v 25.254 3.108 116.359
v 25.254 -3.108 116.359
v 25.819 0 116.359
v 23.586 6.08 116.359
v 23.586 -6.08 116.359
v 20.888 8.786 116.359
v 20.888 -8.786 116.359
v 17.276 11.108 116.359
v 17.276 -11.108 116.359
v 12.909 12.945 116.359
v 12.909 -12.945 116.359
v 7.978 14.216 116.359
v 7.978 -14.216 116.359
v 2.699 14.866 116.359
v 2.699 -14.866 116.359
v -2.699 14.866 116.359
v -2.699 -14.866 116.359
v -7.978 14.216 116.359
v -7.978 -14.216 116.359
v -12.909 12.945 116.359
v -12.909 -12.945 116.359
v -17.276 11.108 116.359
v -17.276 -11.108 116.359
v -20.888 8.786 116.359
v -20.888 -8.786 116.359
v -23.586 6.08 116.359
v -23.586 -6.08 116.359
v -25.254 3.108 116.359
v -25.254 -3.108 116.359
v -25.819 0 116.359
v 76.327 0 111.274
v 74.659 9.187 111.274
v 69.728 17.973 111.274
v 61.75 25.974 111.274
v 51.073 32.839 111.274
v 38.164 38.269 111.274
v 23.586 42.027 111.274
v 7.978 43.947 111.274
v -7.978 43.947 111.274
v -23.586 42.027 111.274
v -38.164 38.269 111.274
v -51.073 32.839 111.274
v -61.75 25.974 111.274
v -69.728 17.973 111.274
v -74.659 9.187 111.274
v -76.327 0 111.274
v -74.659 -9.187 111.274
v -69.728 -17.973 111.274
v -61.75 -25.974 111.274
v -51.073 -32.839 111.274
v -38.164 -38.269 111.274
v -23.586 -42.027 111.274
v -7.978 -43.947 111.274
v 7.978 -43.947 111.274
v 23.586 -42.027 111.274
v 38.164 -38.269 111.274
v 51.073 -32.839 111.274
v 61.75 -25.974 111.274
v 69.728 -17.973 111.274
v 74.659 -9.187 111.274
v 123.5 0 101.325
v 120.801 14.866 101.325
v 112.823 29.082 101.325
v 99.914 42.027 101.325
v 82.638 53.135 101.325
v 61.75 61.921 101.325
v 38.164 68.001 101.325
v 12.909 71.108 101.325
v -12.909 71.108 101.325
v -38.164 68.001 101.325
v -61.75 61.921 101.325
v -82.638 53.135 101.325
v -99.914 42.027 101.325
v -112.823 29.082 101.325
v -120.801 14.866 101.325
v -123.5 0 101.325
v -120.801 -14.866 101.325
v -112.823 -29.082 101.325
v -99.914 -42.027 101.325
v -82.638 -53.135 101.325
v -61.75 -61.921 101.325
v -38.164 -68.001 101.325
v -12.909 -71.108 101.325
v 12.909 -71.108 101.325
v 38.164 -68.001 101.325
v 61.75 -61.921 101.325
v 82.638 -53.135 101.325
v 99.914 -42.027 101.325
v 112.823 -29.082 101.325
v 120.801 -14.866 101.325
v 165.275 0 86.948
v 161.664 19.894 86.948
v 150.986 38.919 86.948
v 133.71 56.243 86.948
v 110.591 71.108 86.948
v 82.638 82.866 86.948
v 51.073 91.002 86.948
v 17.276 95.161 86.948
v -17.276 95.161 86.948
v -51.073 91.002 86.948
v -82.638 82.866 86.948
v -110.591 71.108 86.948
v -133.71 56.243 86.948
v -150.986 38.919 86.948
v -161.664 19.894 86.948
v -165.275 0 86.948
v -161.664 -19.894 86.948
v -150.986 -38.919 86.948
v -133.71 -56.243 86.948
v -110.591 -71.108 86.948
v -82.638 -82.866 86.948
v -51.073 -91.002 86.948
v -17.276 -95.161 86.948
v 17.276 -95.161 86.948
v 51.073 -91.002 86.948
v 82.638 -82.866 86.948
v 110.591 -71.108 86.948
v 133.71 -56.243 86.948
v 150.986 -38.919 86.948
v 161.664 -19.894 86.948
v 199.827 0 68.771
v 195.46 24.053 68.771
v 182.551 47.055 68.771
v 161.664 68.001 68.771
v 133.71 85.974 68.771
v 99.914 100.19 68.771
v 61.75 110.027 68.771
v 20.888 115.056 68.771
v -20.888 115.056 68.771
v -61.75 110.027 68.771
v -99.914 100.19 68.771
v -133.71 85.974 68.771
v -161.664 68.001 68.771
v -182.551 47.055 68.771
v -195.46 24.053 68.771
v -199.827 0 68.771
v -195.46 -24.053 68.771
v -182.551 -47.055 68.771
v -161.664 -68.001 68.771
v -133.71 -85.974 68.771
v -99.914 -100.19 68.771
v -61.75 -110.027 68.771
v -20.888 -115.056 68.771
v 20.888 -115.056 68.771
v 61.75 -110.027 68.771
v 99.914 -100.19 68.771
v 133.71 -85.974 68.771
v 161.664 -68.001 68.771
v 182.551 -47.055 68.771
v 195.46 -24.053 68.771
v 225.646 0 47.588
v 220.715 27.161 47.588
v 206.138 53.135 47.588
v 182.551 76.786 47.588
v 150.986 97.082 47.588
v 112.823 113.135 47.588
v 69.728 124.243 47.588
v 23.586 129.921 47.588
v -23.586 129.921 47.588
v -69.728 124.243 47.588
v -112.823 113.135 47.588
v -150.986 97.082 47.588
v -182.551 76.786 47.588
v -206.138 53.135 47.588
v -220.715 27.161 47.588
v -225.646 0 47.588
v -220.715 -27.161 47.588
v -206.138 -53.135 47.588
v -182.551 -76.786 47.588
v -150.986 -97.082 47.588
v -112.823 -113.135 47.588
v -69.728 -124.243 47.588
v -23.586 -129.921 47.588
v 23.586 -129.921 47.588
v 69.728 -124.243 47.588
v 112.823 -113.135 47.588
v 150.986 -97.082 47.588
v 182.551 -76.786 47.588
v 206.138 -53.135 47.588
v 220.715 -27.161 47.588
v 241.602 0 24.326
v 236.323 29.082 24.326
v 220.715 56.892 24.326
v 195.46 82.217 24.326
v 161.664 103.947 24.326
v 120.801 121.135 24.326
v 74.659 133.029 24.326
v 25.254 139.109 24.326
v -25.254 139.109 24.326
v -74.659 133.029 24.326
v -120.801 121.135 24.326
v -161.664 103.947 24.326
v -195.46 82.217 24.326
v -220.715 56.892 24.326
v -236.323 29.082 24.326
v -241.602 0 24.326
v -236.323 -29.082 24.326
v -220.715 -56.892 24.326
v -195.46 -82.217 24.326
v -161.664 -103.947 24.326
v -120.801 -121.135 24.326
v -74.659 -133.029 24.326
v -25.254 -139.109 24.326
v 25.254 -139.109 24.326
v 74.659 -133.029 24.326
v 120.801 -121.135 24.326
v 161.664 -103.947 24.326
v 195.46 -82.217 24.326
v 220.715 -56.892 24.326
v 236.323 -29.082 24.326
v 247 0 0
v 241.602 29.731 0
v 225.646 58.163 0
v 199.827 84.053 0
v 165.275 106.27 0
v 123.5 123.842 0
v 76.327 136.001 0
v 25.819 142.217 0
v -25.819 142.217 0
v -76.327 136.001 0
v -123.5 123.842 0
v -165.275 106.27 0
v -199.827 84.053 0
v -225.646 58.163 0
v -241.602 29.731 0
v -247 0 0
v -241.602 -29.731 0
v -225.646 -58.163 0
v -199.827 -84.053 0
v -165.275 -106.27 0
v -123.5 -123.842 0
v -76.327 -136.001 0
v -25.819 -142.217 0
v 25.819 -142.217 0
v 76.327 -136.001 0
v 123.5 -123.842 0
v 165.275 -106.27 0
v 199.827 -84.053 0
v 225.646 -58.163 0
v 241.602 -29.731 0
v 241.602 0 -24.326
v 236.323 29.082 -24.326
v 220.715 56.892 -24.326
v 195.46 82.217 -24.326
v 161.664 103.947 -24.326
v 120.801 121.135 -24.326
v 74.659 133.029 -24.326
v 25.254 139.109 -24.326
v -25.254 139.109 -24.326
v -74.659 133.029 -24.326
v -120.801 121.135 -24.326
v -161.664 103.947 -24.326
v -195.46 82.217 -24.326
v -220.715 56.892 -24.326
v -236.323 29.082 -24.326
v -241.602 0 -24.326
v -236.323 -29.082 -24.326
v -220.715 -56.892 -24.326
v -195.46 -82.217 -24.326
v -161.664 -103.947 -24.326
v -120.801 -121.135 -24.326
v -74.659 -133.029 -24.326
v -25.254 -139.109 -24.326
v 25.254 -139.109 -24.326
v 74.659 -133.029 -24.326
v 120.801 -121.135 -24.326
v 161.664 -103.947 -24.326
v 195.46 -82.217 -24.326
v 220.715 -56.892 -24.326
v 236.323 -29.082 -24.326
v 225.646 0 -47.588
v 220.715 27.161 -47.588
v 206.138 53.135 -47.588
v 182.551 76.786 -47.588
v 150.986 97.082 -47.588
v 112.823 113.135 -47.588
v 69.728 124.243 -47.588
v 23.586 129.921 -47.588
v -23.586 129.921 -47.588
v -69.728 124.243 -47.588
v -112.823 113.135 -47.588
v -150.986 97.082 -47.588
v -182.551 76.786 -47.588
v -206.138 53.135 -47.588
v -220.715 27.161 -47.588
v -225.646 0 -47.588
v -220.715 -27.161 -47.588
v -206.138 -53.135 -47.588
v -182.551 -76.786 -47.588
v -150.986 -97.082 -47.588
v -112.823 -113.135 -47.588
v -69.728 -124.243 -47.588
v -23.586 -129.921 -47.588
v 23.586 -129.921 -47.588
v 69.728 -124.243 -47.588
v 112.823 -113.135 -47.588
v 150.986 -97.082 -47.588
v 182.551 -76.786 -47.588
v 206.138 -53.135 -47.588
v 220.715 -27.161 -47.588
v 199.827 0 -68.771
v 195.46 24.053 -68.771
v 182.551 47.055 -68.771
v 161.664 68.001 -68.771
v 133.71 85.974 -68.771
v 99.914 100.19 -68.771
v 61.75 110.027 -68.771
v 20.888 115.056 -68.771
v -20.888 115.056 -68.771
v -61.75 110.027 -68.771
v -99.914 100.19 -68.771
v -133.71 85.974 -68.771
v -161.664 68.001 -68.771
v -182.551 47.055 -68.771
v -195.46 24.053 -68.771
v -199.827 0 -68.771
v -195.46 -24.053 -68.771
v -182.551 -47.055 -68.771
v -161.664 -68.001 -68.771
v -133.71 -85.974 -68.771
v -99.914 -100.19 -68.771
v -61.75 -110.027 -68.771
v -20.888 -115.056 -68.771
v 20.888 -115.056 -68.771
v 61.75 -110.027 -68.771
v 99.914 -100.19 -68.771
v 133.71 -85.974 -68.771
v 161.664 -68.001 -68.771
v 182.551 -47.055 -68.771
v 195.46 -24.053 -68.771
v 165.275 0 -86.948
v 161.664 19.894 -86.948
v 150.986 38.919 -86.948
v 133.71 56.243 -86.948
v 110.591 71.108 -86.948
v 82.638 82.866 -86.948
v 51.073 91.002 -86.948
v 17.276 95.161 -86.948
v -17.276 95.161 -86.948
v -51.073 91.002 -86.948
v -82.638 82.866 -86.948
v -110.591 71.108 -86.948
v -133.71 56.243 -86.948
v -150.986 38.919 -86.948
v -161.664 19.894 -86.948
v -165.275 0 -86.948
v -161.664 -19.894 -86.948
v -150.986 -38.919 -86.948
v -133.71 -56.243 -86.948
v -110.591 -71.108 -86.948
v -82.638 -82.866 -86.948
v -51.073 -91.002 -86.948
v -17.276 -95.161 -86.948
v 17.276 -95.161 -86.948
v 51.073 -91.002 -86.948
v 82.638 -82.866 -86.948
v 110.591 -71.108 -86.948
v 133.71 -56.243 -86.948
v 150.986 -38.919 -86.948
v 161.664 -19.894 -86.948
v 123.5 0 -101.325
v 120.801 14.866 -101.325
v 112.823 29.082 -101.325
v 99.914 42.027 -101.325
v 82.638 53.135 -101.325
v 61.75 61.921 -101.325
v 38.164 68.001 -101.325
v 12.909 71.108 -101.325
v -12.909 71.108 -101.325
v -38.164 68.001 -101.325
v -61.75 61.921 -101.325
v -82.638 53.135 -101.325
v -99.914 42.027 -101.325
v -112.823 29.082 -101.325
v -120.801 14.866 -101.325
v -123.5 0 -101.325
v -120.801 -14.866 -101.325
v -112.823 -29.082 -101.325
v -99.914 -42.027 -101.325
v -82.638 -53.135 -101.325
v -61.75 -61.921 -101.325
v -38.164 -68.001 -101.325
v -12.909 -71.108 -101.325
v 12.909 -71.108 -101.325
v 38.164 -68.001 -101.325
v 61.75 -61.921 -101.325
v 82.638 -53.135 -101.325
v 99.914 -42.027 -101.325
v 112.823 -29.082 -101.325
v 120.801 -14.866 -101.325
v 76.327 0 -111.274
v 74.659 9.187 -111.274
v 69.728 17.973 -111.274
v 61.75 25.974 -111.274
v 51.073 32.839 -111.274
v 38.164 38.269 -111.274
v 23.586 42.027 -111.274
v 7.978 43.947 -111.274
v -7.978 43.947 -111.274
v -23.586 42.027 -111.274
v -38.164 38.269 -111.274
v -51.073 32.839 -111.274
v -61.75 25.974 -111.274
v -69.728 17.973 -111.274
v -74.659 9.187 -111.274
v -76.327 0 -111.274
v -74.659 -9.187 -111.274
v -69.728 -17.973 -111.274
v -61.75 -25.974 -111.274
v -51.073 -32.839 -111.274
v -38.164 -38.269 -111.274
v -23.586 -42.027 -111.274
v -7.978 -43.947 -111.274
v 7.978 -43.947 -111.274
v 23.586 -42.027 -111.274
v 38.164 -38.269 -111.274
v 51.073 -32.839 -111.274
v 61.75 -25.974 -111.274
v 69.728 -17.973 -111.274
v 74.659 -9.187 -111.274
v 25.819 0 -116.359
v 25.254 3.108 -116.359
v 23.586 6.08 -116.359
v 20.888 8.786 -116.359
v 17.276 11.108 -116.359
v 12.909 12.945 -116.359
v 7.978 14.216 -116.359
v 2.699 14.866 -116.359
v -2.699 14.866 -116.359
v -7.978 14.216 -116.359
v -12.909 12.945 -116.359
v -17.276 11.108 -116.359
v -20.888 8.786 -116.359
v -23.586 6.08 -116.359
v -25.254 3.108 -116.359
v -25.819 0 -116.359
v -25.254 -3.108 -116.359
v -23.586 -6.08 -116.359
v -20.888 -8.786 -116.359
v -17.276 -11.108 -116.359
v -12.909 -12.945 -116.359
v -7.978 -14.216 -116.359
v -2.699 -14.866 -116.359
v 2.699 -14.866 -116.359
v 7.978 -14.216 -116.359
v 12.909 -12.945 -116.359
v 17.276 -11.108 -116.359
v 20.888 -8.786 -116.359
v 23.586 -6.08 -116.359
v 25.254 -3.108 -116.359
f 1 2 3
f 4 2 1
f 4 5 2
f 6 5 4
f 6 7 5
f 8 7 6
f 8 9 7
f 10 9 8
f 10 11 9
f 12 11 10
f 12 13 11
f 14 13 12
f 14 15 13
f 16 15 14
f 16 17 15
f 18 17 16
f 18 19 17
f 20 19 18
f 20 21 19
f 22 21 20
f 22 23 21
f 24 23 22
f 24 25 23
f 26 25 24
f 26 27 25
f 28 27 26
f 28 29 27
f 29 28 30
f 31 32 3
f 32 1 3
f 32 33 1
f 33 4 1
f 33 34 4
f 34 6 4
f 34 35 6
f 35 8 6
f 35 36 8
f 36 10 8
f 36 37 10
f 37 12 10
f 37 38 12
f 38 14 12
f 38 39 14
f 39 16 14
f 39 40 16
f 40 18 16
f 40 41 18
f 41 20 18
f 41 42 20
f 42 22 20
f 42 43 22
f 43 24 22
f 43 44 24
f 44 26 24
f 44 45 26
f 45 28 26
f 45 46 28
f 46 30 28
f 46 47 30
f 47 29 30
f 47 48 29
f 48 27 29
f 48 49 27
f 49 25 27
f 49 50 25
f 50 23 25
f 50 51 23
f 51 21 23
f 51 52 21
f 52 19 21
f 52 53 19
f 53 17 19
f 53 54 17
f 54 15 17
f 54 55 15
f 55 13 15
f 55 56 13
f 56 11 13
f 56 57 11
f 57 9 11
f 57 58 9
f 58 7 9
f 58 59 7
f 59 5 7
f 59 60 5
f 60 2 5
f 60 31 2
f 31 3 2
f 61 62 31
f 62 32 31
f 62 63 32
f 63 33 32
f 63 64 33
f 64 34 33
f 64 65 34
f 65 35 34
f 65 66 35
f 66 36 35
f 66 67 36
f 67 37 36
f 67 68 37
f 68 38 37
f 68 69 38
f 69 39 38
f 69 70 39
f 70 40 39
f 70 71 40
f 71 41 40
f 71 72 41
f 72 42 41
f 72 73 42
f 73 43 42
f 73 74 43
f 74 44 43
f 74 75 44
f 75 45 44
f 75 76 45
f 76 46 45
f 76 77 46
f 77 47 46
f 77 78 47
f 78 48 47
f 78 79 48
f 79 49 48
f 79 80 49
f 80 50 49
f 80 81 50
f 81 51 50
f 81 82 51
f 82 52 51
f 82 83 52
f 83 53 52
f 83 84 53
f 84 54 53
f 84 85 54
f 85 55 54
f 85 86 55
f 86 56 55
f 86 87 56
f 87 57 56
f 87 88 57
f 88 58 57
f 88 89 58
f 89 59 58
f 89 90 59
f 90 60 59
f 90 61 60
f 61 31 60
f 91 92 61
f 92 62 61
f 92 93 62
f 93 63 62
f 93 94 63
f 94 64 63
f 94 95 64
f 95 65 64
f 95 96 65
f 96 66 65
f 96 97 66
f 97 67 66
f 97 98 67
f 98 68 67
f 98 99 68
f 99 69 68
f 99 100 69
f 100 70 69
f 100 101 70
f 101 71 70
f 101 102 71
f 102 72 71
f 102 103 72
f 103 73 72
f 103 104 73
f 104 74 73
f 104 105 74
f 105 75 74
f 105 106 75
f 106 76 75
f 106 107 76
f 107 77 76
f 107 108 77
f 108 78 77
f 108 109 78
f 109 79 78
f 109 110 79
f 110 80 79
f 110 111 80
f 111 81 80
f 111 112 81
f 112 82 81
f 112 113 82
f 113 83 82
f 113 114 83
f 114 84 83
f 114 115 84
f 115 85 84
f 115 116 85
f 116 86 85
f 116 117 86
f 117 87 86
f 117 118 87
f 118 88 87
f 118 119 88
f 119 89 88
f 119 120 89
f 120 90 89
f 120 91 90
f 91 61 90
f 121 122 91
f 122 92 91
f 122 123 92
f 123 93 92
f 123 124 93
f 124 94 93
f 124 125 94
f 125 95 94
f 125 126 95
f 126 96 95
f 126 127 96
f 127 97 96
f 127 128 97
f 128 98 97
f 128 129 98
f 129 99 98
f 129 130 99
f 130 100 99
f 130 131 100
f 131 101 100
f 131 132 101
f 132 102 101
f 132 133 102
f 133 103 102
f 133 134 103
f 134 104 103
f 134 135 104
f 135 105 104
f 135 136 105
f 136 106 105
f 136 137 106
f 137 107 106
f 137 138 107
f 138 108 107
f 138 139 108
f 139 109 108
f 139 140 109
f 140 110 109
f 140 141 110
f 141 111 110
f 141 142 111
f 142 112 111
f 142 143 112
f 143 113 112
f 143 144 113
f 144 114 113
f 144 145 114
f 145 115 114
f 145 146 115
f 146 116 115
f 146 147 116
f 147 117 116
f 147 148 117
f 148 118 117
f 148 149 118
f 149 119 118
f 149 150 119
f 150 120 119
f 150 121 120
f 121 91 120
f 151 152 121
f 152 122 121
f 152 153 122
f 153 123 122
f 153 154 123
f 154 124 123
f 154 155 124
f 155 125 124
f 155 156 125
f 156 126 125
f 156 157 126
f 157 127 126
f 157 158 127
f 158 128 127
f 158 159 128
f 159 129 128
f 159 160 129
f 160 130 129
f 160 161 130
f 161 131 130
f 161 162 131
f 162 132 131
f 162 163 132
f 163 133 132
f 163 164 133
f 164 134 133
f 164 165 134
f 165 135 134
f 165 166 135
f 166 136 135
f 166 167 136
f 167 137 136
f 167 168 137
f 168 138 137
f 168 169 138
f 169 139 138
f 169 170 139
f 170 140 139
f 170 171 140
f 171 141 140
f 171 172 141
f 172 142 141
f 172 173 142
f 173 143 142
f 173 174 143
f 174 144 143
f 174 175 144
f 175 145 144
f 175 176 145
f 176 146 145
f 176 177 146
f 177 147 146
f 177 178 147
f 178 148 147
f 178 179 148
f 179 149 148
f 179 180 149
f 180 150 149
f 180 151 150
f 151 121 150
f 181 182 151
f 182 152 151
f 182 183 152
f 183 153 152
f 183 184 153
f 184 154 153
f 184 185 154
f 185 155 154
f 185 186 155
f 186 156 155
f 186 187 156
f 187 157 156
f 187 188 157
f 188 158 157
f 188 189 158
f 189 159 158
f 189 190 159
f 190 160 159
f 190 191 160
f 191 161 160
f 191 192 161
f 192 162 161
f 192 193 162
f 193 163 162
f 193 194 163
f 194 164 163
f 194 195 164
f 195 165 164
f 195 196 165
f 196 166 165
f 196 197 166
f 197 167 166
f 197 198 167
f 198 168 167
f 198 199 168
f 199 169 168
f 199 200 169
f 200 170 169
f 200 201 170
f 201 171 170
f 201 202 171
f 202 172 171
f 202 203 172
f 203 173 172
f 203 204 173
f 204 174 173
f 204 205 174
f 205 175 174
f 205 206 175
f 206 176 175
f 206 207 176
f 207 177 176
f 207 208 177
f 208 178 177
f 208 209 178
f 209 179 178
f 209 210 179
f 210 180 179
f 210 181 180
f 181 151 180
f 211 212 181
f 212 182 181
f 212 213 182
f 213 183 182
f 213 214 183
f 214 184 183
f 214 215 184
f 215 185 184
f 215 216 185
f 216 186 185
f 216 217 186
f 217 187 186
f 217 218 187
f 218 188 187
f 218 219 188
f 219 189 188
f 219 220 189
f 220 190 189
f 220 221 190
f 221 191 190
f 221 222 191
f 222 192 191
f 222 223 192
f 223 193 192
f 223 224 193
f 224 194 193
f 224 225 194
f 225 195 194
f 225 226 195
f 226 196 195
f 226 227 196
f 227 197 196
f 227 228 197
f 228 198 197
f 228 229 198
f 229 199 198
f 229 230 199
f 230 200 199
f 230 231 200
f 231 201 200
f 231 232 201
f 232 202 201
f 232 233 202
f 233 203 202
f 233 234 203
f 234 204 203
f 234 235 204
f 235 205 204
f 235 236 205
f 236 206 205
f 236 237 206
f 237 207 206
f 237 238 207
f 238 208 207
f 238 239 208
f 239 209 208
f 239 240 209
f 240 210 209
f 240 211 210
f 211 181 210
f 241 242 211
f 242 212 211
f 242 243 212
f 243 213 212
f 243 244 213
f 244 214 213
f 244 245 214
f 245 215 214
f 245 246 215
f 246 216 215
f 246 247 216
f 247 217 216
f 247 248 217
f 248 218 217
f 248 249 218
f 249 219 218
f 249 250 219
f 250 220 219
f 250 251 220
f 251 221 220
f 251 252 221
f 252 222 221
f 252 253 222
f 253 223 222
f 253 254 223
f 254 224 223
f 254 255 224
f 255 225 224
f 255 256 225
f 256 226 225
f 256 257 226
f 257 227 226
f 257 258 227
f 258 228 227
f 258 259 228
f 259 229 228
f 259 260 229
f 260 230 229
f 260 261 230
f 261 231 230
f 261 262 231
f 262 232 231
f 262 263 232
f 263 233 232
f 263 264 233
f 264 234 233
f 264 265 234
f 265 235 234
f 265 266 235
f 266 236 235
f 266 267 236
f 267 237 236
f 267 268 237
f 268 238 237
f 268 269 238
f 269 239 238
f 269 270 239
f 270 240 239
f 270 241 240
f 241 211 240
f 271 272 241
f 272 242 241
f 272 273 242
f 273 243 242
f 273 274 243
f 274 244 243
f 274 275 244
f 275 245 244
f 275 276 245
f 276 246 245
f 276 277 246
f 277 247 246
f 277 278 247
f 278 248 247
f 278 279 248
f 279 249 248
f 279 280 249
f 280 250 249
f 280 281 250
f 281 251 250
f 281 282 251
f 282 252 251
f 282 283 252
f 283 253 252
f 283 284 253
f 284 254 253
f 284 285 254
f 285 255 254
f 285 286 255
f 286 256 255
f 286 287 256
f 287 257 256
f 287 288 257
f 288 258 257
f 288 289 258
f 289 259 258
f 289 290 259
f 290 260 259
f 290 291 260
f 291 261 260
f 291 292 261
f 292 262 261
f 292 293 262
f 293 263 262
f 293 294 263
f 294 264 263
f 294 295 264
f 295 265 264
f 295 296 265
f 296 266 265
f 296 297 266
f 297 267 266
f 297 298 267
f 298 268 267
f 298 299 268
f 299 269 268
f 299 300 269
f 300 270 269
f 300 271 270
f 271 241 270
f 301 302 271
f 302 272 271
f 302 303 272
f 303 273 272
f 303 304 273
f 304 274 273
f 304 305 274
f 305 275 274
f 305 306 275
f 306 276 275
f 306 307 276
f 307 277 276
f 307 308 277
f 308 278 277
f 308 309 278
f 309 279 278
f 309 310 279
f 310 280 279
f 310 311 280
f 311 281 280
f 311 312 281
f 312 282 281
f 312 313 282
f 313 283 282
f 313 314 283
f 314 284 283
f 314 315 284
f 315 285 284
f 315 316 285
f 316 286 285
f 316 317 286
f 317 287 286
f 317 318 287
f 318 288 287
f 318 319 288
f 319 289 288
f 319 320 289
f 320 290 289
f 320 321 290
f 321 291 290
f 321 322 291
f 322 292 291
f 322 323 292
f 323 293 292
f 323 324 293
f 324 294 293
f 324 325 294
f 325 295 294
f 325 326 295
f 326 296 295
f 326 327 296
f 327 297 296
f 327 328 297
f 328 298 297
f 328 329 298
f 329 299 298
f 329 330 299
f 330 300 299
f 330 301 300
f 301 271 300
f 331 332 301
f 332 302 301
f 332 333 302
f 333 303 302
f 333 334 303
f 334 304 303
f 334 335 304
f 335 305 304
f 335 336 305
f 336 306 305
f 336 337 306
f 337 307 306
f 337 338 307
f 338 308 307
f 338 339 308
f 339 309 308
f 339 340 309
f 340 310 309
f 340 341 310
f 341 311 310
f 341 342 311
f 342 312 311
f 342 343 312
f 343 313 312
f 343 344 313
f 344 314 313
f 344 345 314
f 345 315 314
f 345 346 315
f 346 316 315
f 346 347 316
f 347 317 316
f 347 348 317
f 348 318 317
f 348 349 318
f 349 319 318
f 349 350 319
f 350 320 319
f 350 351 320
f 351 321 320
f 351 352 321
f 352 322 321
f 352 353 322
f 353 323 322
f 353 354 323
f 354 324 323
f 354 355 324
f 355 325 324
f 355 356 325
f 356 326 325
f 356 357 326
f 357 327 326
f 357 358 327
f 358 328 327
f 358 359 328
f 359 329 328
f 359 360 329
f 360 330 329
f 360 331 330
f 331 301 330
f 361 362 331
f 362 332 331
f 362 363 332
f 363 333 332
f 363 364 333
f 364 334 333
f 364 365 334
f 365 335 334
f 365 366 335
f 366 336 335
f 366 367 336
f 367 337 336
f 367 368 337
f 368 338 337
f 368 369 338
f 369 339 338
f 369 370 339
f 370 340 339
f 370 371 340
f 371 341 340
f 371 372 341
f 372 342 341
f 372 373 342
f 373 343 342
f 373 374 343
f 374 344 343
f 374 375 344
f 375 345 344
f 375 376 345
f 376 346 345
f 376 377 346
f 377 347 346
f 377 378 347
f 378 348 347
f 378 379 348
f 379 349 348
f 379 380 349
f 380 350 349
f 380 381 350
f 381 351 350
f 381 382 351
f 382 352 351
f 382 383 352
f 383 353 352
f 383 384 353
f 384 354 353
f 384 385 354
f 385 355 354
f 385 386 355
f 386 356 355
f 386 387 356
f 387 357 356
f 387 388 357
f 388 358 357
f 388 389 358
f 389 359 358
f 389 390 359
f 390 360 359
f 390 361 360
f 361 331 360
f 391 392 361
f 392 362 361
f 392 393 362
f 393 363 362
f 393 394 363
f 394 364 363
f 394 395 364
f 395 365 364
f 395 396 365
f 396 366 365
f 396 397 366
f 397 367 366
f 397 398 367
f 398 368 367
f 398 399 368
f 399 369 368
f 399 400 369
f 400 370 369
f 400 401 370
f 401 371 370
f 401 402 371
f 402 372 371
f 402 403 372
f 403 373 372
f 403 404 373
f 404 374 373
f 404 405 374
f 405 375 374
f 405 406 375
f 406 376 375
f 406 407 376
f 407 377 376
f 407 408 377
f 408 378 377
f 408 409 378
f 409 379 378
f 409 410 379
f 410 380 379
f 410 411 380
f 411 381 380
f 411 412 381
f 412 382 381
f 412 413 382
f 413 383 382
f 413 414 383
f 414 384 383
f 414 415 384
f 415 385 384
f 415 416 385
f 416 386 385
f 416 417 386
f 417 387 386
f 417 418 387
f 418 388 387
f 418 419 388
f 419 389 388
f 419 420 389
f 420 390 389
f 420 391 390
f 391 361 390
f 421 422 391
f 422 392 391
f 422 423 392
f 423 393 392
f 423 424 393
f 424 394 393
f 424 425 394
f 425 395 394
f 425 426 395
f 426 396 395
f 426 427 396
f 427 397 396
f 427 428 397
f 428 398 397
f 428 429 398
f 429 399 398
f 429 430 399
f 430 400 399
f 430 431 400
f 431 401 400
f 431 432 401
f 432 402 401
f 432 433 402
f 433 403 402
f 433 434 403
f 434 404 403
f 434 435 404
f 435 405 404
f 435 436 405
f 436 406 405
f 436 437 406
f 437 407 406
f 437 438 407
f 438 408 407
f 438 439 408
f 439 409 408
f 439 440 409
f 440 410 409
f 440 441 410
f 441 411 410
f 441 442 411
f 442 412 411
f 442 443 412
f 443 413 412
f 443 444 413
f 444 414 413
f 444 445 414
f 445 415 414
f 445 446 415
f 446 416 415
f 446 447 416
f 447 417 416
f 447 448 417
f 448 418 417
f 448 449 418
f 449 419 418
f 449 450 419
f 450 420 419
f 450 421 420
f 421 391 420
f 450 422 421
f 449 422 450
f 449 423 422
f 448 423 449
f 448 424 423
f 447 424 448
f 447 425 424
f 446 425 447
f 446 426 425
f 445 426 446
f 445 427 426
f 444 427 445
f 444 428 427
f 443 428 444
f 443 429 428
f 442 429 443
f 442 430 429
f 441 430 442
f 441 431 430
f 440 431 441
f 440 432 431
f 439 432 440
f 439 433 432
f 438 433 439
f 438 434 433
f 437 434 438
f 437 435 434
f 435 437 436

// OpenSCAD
// Generated by SolidPython 1.0.1 on 2020-07-29 00:46:54


scale(v = [19, 11, 9]) {
	sphere(r = 13);
}
/***********************************************
*********      SolidPython code:      **********
************************************************
 
# import packages: SolidPython
from solid import *
from solid.utils import *
from itertools import chain, combinations, permutations


class Resize:

    def __init__(self, scad_file):
        self.scad_file = scad_file
        #self.scad_file = import_scad(scad_file)
        # cone/cylinder param:
        self.r1 = 0
        self.r2 = 0
        self.h = 0
        # rectangular prism param:
        self.w = 0
        self.l = 0
        # ellipse param:
        self.r = 0

    # import OpenScad code (file name corresponds to shape)


    # classify shape + parameters
    def assign(self, param1, param2, param3):
        if self.scad_file == 'cone.scad':
            self.r1 = param1
            self.r2 = param2
            self.h = param3
        elif self.scad_file == 'cylinder.scad':
            self.r1 = param1
            self.r2 = param2
            self.h = param3
        elif self.scad_file == 'rectangularPrism.scad':
            self.h = param1
            self.l = param2
            self.w = param3
        else:
            self.r = param1
            self.h = param2

    # resize parameters
    def iterate(self):
        x = range(3, 20, 2)
        i = 1
        if self.scad_file == 'cone.scad':
            tempList = list(permutations(x, 2))
            for temp in tempList:
                param1 = temp[0]
                param2 = temp[1]
                filepath = 'produced_scad_files/' + 'cone' + str(param1) + '_' + str(param2) + '_' + '.scad'
                scad_render_to_file(cylinder(h=param1, r1=param2, r2=0), filepath)

        elif self.scad_file == 'cylinder.scad':
            tempList = list(permutations(x, 3))
            for temp in tempList:
                param1 = temp[0]
                param2 = temp[1]
                filepath = 'produced_scad_files/' + 'cylinder' + str(param1) + '_' + str(param2) + '_' + '.scad'
                scad_render_to_file(cylinder(h=param1, r1=param2, r2=param2), filepath)

        elif self.scad_file == 'rectangularPrism.scad':
            tempList = list(permutations(x, 3))
            for temp in tempList:
                param1 = temp[0]
                param2 = temp[1]
                param3 = temp[2]
                filepath = 'produced_scad_files/' + 'rectangularPrism' + str(param1) + '_' + str(param2) + '_' + str(
                    param3) + '.scad'
                scad_render_to_file(cube(size=(param1, param2, param3)), filepath)

        elif self.scad_file == 'ellipse.scad':
            tempList = list(permutations(x, 4))
            for temp in tempList:
                param1 = temp[0]
                param2 = temp[1]
                param3 = temp[2]
                param4 = temp[3]
                filepath = 'produced_scad_files/' + 'ellipse' + str(param1) + '_' + str(param2) + '_' + str(param3) + '_' + str(param4) + '.scad'
                scad_render_to_file(scale([param1, param2, param3])(sphere(r=param4)), filepath)

    def render_to_scadfile(self):
        scad_render_to_file(scad, 'example.scad') 
 
************************************************/
